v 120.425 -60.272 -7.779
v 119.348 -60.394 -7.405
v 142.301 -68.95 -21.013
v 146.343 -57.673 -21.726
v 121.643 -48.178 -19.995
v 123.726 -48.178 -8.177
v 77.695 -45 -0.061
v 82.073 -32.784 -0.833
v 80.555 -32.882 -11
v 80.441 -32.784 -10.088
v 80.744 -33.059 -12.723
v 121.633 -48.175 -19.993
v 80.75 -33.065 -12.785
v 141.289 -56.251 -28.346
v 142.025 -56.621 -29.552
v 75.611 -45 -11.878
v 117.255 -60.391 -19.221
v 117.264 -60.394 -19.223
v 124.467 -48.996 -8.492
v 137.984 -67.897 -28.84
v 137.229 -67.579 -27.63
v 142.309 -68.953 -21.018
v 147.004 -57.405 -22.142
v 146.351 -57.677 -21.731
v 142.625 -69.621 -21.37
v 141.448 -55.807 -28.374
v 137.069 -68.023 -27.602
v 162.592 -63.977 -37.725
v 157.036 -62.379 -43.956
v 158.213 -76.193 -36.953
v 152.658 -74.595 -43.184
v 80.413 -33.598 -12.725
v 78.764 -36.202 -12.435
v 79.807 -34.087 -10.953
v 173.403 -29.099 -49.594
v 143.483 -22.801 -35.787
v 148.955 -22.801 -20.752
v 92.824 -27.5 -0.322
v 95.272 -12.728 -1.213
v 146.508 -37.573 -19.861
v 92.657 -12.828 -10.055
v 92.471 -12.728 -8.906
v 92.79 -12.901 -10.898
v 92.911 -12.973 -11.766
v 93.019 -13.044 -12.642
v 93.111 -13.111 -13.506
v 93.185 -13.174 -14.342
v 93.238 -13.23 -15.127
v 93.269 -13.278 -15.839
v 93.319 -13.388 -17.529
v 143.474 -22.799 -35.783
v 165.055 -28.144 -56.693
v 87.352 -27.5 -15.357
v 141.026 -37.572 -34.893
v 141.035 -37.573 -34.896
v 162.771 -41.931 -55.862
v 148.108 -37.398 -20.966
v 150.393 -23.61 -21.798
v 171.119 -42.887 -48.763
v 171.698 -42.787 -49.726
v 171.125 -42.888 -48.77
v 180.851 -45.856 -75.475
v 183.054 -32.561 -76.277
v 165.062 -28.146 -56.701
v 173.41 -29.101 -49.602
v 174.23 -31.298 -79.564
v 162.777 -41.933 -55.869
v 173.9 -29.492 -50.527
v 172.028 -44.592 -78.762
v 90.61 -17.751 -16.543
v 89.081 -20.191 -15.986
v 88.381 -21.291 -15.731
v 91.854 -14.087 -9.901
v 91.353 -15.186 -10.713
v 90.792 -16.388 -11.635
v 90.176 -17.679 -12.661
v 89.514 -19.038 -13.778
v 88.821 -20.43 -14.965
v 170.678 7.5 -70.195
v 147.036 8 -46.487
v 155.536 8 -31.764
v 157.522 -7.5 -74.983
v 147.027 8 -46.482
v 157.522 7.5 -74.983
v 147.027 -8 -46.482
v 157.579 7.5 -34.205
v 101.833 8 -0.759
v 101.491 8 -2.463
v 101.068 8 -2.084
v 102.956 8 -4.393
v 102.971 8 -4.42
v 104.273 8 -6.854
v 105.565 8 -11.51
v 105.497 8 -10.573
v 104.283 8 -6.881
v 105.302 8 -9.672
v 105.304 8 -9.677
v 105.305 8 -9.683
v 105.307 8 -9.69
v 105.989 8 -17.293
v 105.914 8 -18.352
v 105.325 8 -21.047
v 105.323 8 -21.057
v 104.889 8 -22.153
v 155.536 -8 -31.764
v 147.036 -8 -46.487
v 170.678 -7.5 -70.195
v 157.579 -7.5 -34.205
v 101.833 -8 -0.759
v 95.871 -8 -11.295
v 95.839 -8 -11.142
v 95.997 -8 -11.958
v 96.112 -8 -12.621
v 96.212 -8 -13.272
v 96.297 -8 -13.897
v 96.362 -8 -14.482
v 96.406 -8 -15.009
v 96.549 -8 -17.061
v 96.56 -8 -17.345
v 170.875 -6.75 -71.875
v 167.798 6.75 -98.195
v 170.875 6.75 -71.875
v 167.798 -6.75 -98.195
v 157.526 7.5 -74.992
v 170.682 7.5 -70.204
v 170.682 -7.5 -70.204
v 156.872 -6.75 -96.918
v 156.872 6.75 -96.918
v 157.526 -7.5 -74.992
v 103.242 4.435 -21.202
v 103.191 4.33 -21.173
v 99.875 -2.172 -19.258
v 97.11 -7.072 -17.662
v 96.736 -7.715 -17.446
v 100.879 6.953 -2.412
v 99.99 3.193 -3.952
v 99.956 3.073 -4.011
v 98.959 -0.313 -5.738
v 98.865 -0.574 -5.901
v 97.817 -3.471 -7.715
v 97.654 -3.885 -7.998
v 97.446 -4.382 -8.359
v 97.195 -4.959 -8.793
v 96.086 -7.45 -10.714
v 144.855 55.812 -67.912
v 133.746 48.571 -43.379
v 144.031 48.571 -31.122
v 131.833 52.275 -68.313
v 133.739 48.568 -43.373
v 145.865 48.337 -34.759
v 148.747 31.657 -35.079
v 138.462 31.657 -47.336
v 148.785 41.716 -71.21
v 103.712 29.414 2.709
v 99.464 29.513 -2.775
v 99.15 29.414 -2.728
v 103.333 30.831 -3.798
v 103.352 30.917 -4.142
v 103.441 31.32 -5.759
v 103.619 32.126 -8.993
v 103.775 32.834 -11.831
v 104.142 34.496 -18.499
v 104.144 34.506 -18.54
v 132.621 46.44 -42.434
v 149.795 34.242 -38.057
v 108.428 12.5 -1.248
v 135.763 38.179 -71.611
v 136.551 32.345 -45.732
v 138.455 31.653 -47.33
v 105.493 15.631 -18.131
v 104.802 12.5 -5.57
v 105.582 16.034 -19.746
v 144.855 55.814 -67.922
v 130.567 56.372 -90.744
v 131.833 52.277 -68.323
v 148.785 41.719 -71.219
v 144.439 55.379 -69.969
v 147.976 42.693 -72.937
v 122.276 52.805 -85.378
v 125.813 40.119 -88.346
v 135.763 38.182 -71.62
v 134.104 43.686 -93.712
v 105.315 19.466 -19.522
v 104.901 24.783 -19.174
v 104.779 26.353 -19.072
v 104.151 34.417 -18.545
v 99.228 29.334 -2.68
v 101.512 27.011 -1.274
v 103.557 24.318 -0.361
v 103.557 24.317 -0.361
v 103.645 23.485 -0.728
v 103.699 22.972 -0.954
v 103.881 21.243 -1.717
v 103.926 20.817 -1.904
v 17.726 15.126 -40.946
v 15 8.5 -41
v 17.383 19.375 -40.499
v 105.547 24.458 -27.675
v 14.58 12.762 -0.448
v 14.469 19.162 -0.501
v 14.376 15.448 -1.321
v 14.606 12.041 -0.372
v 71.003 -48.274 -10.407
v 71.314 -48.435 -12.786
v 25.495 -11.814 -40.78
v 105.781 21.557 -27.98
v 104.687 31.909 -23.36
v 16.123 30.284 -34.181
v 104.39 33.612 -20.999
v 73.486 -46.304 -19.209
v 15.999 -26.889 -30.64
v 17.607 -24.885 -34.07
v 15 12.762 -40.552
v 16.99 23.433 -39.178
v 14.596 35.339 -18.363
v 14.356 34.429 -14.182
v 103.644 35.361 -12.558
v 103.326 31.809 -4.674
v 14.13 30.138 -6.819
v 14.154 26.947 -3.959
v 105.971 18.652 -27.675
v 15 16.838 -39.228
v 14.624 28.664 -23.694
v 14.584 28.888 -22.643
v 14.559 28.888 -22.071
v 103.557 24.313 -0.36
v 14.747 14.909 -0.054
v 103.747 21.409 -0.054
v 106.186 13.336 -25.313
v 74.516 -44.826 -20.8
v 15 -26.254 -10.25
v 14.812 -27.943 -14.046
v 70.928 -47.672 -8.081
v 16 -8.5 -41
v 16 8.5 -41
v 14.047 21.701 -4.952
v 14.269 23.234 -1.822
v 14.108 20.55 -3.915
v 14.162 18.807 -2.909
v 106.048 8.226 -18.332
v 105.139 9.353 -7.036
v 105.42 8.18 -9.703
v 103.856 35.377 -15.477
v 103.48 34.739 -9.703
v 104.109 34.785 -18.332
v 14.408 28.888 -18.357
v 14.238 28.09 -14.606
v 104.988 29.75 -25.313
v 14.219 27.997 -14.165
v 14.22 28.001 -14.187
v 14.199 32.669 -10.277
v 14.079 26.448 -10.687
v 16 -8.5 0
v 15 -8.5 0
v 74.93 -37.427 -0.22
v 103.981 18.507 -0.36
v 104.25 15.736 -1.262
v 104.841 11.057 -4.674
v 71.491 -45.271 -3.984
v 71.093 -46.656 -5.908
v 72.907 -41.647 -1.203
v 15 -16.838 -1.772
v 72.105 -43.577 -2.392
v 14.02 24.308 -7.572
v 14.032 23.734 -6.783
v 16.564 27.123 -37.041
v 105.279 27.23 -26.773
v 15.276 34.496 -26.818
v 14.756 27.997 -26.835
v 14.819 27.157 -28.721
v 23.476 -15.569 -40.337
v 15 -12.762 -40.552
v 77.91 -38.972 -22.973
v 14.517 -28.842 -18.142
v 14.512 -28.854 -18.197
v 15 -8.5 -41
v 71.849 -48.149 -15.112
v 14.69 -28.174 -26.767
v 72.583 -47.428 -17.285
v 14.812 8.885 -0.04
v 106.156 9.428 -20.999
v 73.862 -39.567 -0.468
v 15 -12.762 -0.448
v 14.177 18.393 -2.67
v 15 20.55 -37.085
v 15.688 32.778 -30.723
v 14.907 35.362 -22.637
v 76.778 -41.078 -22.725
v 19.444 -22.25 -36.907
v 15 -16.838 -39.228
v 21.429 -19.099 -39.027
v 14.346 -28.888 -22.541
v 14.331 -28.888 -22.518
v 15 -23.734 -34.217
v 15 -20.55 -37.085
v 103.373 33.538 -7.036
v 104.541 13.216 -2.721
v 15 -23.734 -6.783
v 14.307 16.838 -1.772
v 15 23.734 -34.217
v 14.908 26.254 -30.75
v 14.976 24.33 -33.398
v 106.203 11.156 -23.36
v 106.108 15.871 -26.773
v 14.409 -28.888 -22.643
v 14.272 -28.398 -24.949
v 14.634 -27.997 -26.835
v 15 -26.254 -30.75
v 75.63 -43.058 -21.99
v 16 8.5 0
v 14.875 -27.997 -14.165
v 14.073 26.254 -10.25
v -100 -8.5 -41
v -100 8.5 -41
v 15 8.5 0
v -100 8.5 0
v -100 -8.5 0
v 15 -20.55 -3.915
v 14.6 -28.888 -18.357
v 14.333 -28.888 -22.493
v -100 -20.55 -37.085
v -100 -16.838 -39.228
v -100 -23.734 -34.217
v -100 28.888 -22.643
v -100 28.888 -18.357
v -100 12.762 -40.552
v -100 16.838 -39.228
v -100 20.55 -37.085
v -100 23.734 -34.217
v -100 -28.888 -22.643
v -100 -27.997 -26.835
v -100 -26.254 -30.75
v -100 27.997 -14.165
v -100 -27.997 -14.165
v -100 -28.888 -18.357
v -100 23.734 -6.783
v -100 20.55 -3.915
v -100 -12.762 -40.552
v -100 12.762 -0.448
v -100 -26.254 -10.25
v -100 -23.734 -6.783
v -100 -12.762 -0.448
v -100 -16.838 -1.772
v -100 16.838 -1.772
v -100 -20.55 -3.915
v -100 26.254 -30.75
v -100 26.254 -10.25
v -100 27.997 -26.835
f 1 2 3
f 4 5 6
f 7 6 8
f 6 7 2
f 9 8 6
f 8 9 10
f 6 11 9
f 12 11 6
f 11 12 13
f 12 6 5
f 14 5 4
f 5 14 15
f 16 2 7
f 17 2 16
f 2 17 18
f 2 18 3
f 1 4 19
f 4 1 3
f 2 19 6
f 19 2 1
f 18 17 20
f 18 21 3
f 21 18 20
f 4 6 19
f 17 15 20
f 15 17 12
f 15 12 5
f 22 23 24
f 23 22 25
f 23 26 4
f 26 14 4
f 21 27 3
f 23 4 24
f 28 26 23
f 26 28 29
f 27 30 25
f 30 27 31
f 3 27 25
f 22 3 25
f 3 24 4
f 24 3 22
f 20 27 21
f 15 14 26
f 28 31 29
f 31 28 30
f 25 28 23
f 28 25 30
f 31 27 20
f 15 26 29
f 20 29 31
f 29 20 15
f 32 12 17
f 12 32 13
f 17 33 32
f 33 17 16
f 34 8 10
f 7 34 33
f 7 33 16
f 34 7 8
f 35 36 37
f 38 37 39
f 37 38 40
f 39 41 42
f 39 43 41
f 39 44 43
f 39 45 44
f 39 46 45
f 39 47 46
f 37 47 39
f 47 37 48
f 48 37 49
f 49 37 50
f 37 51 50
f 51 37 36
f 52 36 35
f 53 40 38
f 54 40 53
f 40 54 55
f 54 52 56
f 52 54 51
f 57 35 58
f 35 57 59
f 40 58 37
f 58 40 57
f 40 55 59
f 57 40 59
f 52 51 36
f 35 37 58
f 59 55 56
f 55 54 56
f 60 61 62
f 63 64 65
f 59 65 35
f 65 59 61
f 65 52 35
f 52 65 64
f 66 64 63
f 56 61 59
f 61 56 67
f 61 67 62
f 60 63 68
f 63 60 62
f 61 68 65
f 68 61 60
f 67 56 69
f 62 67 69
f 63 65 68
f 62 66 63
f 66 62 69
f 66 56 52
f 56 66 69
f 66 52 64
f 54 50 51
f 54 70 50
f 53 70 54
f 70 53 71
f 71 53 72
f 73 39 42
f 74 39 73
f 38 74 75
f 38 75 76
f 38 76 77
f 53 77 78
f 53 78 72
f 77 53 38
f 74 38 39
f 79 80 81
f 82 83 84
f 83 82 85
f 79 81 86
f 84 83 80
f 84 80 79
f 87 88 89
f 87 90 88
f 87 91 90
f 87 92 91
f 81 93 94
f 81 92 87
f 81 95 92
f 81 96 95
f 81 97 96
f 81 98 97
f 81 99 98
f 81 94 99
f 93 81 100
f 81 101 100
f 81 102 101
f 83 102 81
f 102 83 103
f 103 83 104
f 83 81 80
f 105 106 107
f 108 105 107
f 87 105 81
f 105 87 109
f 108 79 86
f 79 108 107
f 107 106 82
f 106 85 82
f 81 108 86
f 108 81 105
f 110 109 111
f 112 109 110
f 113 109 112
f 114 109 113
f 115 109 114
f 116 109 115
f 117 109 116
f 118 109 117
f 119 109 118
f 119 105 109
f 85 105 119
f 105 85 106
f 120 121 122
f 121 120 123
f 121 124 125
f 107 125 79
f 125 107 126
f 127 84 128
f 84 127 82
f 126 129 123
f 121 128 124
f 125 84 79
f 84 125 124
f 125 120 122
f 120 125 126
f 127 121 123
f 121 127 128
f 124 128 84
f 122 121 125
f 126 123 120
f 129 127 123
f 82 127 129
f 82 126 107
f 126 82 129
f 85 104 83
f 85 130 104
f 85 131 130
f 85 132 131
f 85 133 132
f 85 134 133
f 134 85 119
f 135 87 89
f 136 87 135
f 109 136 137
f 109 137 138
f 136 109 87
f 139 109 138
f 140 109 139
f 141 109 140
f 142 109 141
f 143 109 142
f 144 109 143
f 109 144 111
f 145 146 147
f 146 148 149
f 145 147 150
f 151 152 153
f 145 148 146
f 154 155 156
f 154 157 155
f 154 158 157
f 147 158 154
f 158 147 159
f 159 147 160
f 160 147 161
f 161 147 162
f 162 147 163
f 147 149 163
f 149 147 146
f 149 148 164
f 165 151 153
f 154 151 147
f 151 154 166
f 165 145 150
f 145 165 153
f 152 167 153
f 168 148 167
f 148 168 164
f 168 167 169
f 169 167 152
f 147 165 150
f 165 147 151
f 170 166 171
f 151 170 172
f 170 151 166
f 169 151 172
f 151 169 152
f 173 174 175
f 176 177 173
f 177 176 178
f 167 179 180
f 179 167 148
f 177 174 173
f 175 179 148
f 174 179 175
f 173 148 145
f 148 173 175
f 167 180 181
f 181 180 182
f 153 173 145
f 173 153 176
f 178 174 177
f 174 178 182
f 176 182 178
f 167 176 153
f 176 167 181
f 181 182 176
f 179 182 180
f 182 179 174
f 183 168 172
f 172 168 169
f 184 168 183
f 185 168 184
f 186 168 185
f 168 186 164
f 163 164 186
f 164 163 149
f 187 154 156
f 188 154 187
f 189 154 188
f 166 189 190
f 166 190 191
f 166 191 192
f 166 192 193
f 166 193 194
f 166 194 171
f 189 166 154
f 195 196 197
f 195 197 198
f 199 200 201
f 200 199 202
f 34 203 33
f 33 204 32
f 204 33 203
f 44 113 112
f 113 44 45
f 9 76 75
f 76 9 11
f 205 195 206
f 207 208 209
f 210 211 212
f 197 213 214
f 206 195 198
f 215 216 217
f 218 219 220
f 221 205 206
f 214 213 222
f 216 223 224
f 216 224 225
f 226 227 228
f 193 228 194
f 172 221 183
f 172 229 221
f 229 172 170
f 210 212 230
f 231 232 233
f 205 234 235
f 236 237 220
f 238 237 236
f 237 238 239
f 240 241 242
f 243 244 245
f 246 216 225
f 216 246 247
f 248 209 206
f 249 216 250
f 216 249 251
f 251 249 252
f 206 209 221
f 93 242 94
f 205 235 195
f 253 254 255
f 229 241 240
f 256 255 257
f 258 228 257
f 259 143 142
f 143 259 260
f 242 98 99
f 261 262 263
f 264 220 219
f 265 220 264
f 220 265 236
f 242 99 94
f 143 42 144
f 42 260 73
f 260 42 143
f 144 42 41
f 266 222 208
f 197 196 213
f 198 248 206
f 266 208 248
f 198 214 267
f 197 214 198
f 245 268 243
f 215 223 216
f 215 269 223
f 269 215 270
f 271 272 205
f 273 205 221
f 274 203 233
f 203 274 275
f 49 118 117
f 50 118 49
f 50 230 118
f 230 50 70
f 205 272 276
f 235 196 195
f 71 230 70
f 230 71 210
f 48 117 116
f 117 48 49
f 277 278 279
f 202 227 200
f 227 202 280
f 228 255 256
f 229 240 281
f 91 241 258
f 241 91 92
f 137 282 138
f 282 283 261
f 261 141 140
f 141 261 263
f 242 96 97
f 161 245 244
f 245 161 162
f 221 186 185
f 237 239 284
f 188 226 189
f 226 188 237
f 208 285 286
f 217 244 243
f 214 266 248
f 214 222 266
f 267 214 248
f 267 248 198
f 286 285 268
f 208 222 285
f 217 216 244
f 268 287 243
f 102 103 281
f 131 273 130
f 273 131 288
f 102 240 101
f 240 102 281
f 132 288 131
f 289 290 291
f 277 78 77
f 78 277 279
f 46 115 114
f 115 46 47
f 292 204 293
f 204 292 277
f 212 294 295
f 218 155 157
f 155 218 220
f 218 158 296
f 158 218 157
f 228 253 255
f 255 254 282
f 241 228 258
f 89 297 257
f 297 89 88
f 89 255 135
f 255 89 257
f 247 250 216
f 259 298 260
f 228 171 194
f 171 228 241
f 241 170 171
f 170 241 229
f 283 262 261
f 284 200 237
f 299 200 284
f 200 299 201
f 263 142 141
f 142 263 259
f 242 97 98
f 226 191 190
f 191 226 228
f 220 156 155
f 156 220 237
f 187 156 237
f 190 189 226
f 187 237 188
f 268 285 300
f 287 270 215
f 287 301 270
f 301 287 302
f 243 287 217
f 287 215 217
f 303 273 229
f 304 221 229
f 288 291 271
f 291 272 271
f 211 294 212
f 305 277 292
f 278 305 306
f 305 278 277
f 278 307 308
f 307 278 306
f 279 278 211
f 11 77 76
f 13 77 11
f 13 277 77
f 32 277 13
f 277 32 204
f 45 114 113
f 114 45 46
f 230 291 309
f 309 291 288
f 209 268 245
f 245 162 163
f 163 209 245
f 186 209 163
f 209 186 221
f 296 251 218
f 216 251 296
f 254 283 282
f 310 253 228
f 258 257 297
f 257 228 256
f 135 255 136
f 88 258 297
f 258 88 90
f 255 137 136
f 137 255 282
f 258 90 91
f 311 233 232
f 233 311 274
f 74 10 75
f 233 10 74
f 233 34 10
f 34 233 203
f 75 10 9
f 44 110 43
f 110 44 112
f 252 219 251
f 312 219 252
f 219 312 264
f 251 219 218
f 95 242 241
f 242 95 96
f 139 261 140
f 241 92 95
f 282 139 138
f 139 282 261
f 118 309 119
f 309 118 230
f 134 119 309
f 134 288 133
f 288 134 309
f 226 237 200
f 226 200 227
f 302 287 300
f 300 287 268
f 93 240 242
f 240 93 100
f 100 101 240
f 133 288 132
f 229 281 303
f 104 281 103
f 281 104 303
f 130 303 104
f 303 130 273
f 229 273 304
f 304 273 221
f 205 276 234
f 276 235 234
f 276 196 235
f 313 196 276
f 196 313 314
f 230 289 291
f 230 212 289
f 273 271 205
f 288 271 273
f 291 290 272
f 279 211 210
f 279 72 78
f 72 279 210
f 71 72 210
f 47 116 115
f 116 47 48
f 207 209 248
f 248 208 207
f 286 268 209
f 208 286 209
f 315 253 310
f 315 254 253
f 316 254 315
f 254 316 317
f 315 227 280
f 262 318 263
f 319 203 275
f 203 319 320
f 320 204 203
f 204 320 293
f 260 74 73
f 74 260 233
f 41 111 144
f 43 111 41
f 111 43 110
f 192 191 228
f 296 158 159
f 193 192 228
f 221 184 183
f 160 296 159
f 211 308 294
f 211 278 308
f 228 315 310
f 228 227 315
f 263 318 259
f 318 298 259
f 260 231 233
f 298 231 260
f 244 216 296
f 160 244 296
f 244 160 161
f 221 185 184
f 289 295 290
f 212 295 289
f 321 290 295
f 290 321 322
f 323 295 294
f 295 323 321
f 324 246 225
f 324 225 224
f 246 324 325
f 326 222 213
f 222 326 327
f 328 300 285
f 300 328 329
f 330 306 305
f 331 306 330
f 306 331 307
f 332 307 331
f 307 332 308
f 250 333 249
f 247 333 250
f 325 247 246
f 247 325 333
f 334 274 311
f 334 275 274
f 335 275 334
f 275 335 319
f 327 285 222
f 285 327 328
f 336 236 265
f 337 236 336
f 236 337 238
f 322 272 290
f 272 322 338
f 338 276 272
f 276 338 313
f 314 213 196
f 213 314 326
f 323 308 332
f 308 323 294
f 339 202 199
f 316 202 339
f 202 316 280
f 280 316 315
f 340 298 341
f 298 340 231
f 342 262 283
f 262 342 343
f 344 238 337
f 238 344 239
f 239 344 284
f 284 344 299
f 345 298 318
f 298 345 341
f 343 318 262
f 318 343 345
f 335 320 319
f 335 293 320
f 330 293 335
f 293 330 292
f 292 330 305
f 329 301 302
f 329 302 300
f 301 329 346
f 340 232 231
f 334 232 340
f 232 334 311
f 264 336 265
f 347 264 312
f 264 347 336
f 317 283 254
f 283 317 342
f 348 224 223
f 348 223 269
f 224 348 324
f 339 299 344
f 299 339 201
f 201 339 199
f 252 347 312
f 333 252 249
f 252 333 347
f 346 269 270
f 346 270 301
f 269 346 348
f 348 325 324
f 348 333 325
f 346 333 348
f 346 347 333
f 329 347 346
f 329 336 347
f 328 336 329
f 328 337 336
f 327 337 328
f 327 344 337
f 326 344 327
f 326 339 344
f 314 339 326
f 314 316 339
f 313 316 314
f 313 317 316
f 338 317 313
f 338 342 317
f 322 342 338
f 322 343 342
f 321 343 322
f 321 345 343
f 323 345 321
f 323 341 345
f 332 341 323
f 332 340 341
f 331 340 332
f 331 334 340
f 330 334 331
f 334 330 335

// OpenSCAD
PINKY_FINGER = [[45, 13, 12],[27, 12, 9], [23, 13, 8.5]];
RING_FINGER = [[58, 15, 16],[36.5, 14, 11], [27.5, 13.5, 9.5]];
MIDDLE_FINGER = [[62, 16, 17],[38.3, 15, 14], [26.5, 13.5, 11]];
INDEX_FINGER = [[56, 18, 16],[34, 15, 13.5], [25, 13.5, 10.5]];

PINKY_POS = [77, -38.5, 0];
RING_POS = [91, -20, 0];
MIDDLE_POS = [99, 0, 0];
INDEX_POS = [105, 21.5, 0];

PINKY_ANGLES = [10, 20, 2/3 * 20, -20];
RING_ANGLES = [20, 30, 2/3 * 30, -10];
MIDDLE_ANGLES = [30, 40, 2/3 * 40, 0];
INDEX_ANGLES = [40, 50, 2/3 * 50, 20];

FINGER_BONE_POS = 2/3; // The vertical positions of the joints

WRIST_WIDTH = 58;
PALM_LENGTH = 61;
OUTSIDE_KNUCKLE_THICKNESS = 23;
INSIDE_KNUCKLE_THICKNESS = 28;
PALM_BASE_THICKNESS = 41;
ARM_LENGTH = 100;


PROXIMATE = 0;
INTERMEDIATE = 1;
DISTAL = 2;

X_AXIS = [1, 0, 0];
Y_AXIS = [0, 1, 0];
Z_AXIS = [0, 0, 1];


module FingerSegment(length, width, thickness)
{
	cube([length, width, thickness]);
}

module TranslateAndBendTwo(prev, cur, angle)
{
	translate([0, (prev.y - cur.y) / 2, (prev.z - cur.z)])
	TranslateAndBendOne(cur, angle, 0)
	children();
}

module TranslateAndBendOne(cur, angle, side_angle)
{
	translate([0, 0, cur.z * FINGER_BONE_POS])
	rotate(a = angle, v = Y_AXIS)
	rotate(a = side_angle, v = Z_AXIS)
	translate([0, 0, -cur.z * FINGER_BONE_POS])
	children();
}

module Finger(sizes, angles)
{
	proximate_s = sizes[PROXIMATE];
	intermediate_s = sizes[INTERMEDIATE];
	distal_s = sizes[DISTAL];

	proximate_a = angles[PROXIMATE];
	intermediate_a = angles[INTERMEDIATE];
	distal_a = angles[DISTAL];
	side_a = angles[3];
	
	translate([0, -proximate_s.y / 2, -proximate_s.z]) 
	TranslateAndBendOne(proximate_s, proximate_a, side_a)
	{
		translate([proximate_s.x, 0, 0])
		{
			color("green")
			hull()
			{
				cube([0.01, proximate_s.y, proximate_s.z]);
				TranslateAndBendTwo(proximate_s, intermediate_s, intermediate_a)
				{
					//Intermediates
					cube(intermediate_s);
				}
			}

			TranslateAndBendTwo(proximate_s, intermediate_s, intermediate_a)
			{

				translate([intermediate_s.x, 0, 0])
				color("red")
				hull()
				{
					cube([0.01, intermediate_s.y, intermediate_s.z]);
					TranslateAndBendTwo(intermediate_s, distal_s, distal_a)
					{
						// Distals
						cube(distal_s);
					}
				}
			}
		 }
		// Proximates
		color("blue") cube(proximate_s);
	}
}

function CylinderAngle(h, r1, r2) = 
	let(y=abs(r1-r2))
	atan(y / h);

module WristSide(length)
{
	wrist_cylinder_radius = PALM_BASE_THICKNESS / 2;
	translate([0, WRIST_WIDTH / 2 - wrist_cylinder_radius, - wrist_cylinder_radius + PINKY_POS.z])
	rotate(a = 90, v = Y_AXIS)
	cylinder(length, r1 = wrist_cylinder_radius, r2 = wrist_cylinder_radius);
}

module Palm()
{
	wrist_length = PINKY_POS.x - PALM_LENGTH;
	hull()
	{
		outside = [PALM_LENGTH, PALM_BASE_THICKNESS / 2, OUTSIDE_KNUCKLE_THICKNESS / 2];
		outside_cylinder_angle = CylinderAngle(outside[0], outside[1], outside[2]);
		outside_pos = abs(PINKY_POS.y - outside[2]);
		wrist_half_width = WRIST_WIDTH / 2;
		diff = outside_pos - wrist_half_width;
		outside_angle = atan(diff / outside[0]);
		
		translate([PINKY_POS.x, PINKY_POS.y, -outside[1]])
		rotate(a = -outside_cylinder_angle - outside_angle, v = Z_AXIS)
		translate(-[outside[0], 0, 0])
		rotate(a = 90 - outside_cylinder_angle, v = Y_AXIS)
		cylinder(outside[0], outside[1], outside[2]);

		inside = [PALM_LENGTH + INDEX_POS.x - PINKY_POS.x, PALM_BASE_THICKNESS / 2, INSIDE_KNUCKLE_THICKNESS / 2];
		inside_cylinder_angle = CylinderAngle(inside[0], inside[1], inside[2]);

		translate([INDEX_POS.x, INDEX_POS.y, -inside[1]])
		rotate(a = inside_cylinder_angle, v = Z_AXIS)
		translate(-[inside[0], 0, 0])
		rotate(a = 90 - inside_cylinder_angle, v = Y_AXIS)
		cylinder(inside[0], inside[1], inside[2]);

		overlap = 1;
		translate([wrist_length - overlap, 0 , 0])
		WristSide(overlap);
		
		translate([wrist_length - overlap, 0 , 0])
		mirror(Y_AXIS)
		WristSide(overlap);
	}
	hull()
	{

		WristSide(wrist_length);
		
		mirror(Y_AXIS)
		WristSide(wrist_length);

	}
	hull()
	{
		mirror(X_AXIS)
		WristSide(ARM_LENGTH);

		mirror(Y_AXIS)
		mirror(X_AXIS)
		WristSide(ARM_LENGTH);
	}
}

translate(PINKY_POS) Finger(PINKY_FINGER, PINKY_ANGLES);
translate(RING_POS) Finger(RING_FINGER, RING_ANGLES);
translate(MIDDLE_POS) Finger(MIDDLE_FINGER, MIDDLE_ANGLES);
translate(INDEX_POS) Finger(INDEX_FINGER, INDEX_ANGLES);
Palm();
